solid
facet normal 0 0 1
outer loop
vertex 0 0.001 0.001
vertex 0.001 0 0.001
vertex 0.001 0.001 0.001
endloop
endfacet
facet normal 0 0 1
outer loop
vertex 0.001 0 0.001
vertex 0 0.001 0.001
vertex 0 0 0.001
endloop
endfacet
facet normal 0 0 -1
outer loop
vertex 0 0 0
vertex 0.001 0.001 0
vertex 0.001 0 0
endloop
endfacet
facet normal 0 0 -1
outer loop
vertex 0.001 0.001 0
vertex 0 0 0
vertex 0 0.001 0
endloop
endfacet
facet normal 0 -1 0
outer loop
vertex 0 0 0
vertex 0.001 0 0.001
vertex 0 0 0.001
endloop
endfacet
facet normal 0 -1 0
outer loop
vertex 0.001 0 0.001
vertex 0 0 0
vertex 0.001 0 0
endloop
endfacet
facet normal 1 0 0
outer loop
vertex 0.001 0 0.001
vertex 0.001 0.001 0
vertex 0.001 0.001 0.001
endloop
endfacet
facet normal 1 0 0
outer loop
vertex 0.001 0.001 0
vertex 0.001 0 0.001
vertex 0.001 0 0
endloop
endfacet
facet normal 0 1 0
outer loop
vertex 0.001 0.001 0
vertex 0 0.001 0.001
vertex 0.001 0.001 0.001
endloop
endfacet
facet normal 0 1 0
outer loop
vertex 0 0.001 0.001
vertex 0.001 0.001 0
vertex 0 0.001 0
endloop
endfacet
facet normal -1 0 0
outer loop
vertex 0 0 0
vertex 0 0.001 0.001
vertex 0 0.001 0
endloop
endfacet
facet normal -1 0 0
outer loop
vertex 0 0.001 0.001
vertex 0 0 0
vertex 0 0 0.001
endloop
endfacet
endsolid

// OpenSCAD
// t_smoke — proves the assert gate itself works.
//
// Tests are assert-only and must end in a sentinel cube: a file that emits no
// geometry exits 1 under `-o *.stl`, which would look like a test failure.
// Always render tests to .stl, never .csg -- with -o *.csg a FAILING assert
// exits 0, so a .csg gate reports every broken test as green. See AGENTS.md.

// The rule that replaces acos() everywhere (docs/developer/history.md §3).
function turn(a, b) = atan2(norm(cross(a, b)), a * b);

assert(abs(turn([1, 0, 0], [0, 1, 0]) - 90) < 1e-9, "turn(): orthogonal vectors must give 90 degrees");
assert(abs(turn([1, 0, 0], [1, 0, 0])) < 1e-9, "turn(): identical vectors must give 0 degrees");
assert(abs(turn([1, 0, 0], [-1, 0, 0]) - 180) < 1e-9, "turn(): opposed vectors must give 180 degrees");

// The specific failure this rule exists to prevent: acos() NaNs when float error
// pushes its argument past 1.0, which is the near-collinear waypoint case.
// OpenSCAD 2021.01 has no is_nan(); the idioms that DO work here are
// `is_num(x)` (false for nan, true for inf) and `x == x` (false for nan only).
nearly = [1, 1e-9, 0];
assert(is_num(turn([1, 0, 0], nearly)), "turn(): must not NaN on near-collinear vectors");
assert(!is_num(acos(1.0000001)), "acos() past 1.0 is nan on 2021.01 -- this is why turn() exists");

// Exact developed length of the worked elbow (docs/reference/ir.md): 35 + quarter-arc + 35.
len_expected = 35 + (90 / 360) * 2 * PI * 15 + 35;
assert(abs(len_expected - 93.5619449019) < 1e-9, "worked elbow developed length");

cube(0.001); // sentinel -- see header
